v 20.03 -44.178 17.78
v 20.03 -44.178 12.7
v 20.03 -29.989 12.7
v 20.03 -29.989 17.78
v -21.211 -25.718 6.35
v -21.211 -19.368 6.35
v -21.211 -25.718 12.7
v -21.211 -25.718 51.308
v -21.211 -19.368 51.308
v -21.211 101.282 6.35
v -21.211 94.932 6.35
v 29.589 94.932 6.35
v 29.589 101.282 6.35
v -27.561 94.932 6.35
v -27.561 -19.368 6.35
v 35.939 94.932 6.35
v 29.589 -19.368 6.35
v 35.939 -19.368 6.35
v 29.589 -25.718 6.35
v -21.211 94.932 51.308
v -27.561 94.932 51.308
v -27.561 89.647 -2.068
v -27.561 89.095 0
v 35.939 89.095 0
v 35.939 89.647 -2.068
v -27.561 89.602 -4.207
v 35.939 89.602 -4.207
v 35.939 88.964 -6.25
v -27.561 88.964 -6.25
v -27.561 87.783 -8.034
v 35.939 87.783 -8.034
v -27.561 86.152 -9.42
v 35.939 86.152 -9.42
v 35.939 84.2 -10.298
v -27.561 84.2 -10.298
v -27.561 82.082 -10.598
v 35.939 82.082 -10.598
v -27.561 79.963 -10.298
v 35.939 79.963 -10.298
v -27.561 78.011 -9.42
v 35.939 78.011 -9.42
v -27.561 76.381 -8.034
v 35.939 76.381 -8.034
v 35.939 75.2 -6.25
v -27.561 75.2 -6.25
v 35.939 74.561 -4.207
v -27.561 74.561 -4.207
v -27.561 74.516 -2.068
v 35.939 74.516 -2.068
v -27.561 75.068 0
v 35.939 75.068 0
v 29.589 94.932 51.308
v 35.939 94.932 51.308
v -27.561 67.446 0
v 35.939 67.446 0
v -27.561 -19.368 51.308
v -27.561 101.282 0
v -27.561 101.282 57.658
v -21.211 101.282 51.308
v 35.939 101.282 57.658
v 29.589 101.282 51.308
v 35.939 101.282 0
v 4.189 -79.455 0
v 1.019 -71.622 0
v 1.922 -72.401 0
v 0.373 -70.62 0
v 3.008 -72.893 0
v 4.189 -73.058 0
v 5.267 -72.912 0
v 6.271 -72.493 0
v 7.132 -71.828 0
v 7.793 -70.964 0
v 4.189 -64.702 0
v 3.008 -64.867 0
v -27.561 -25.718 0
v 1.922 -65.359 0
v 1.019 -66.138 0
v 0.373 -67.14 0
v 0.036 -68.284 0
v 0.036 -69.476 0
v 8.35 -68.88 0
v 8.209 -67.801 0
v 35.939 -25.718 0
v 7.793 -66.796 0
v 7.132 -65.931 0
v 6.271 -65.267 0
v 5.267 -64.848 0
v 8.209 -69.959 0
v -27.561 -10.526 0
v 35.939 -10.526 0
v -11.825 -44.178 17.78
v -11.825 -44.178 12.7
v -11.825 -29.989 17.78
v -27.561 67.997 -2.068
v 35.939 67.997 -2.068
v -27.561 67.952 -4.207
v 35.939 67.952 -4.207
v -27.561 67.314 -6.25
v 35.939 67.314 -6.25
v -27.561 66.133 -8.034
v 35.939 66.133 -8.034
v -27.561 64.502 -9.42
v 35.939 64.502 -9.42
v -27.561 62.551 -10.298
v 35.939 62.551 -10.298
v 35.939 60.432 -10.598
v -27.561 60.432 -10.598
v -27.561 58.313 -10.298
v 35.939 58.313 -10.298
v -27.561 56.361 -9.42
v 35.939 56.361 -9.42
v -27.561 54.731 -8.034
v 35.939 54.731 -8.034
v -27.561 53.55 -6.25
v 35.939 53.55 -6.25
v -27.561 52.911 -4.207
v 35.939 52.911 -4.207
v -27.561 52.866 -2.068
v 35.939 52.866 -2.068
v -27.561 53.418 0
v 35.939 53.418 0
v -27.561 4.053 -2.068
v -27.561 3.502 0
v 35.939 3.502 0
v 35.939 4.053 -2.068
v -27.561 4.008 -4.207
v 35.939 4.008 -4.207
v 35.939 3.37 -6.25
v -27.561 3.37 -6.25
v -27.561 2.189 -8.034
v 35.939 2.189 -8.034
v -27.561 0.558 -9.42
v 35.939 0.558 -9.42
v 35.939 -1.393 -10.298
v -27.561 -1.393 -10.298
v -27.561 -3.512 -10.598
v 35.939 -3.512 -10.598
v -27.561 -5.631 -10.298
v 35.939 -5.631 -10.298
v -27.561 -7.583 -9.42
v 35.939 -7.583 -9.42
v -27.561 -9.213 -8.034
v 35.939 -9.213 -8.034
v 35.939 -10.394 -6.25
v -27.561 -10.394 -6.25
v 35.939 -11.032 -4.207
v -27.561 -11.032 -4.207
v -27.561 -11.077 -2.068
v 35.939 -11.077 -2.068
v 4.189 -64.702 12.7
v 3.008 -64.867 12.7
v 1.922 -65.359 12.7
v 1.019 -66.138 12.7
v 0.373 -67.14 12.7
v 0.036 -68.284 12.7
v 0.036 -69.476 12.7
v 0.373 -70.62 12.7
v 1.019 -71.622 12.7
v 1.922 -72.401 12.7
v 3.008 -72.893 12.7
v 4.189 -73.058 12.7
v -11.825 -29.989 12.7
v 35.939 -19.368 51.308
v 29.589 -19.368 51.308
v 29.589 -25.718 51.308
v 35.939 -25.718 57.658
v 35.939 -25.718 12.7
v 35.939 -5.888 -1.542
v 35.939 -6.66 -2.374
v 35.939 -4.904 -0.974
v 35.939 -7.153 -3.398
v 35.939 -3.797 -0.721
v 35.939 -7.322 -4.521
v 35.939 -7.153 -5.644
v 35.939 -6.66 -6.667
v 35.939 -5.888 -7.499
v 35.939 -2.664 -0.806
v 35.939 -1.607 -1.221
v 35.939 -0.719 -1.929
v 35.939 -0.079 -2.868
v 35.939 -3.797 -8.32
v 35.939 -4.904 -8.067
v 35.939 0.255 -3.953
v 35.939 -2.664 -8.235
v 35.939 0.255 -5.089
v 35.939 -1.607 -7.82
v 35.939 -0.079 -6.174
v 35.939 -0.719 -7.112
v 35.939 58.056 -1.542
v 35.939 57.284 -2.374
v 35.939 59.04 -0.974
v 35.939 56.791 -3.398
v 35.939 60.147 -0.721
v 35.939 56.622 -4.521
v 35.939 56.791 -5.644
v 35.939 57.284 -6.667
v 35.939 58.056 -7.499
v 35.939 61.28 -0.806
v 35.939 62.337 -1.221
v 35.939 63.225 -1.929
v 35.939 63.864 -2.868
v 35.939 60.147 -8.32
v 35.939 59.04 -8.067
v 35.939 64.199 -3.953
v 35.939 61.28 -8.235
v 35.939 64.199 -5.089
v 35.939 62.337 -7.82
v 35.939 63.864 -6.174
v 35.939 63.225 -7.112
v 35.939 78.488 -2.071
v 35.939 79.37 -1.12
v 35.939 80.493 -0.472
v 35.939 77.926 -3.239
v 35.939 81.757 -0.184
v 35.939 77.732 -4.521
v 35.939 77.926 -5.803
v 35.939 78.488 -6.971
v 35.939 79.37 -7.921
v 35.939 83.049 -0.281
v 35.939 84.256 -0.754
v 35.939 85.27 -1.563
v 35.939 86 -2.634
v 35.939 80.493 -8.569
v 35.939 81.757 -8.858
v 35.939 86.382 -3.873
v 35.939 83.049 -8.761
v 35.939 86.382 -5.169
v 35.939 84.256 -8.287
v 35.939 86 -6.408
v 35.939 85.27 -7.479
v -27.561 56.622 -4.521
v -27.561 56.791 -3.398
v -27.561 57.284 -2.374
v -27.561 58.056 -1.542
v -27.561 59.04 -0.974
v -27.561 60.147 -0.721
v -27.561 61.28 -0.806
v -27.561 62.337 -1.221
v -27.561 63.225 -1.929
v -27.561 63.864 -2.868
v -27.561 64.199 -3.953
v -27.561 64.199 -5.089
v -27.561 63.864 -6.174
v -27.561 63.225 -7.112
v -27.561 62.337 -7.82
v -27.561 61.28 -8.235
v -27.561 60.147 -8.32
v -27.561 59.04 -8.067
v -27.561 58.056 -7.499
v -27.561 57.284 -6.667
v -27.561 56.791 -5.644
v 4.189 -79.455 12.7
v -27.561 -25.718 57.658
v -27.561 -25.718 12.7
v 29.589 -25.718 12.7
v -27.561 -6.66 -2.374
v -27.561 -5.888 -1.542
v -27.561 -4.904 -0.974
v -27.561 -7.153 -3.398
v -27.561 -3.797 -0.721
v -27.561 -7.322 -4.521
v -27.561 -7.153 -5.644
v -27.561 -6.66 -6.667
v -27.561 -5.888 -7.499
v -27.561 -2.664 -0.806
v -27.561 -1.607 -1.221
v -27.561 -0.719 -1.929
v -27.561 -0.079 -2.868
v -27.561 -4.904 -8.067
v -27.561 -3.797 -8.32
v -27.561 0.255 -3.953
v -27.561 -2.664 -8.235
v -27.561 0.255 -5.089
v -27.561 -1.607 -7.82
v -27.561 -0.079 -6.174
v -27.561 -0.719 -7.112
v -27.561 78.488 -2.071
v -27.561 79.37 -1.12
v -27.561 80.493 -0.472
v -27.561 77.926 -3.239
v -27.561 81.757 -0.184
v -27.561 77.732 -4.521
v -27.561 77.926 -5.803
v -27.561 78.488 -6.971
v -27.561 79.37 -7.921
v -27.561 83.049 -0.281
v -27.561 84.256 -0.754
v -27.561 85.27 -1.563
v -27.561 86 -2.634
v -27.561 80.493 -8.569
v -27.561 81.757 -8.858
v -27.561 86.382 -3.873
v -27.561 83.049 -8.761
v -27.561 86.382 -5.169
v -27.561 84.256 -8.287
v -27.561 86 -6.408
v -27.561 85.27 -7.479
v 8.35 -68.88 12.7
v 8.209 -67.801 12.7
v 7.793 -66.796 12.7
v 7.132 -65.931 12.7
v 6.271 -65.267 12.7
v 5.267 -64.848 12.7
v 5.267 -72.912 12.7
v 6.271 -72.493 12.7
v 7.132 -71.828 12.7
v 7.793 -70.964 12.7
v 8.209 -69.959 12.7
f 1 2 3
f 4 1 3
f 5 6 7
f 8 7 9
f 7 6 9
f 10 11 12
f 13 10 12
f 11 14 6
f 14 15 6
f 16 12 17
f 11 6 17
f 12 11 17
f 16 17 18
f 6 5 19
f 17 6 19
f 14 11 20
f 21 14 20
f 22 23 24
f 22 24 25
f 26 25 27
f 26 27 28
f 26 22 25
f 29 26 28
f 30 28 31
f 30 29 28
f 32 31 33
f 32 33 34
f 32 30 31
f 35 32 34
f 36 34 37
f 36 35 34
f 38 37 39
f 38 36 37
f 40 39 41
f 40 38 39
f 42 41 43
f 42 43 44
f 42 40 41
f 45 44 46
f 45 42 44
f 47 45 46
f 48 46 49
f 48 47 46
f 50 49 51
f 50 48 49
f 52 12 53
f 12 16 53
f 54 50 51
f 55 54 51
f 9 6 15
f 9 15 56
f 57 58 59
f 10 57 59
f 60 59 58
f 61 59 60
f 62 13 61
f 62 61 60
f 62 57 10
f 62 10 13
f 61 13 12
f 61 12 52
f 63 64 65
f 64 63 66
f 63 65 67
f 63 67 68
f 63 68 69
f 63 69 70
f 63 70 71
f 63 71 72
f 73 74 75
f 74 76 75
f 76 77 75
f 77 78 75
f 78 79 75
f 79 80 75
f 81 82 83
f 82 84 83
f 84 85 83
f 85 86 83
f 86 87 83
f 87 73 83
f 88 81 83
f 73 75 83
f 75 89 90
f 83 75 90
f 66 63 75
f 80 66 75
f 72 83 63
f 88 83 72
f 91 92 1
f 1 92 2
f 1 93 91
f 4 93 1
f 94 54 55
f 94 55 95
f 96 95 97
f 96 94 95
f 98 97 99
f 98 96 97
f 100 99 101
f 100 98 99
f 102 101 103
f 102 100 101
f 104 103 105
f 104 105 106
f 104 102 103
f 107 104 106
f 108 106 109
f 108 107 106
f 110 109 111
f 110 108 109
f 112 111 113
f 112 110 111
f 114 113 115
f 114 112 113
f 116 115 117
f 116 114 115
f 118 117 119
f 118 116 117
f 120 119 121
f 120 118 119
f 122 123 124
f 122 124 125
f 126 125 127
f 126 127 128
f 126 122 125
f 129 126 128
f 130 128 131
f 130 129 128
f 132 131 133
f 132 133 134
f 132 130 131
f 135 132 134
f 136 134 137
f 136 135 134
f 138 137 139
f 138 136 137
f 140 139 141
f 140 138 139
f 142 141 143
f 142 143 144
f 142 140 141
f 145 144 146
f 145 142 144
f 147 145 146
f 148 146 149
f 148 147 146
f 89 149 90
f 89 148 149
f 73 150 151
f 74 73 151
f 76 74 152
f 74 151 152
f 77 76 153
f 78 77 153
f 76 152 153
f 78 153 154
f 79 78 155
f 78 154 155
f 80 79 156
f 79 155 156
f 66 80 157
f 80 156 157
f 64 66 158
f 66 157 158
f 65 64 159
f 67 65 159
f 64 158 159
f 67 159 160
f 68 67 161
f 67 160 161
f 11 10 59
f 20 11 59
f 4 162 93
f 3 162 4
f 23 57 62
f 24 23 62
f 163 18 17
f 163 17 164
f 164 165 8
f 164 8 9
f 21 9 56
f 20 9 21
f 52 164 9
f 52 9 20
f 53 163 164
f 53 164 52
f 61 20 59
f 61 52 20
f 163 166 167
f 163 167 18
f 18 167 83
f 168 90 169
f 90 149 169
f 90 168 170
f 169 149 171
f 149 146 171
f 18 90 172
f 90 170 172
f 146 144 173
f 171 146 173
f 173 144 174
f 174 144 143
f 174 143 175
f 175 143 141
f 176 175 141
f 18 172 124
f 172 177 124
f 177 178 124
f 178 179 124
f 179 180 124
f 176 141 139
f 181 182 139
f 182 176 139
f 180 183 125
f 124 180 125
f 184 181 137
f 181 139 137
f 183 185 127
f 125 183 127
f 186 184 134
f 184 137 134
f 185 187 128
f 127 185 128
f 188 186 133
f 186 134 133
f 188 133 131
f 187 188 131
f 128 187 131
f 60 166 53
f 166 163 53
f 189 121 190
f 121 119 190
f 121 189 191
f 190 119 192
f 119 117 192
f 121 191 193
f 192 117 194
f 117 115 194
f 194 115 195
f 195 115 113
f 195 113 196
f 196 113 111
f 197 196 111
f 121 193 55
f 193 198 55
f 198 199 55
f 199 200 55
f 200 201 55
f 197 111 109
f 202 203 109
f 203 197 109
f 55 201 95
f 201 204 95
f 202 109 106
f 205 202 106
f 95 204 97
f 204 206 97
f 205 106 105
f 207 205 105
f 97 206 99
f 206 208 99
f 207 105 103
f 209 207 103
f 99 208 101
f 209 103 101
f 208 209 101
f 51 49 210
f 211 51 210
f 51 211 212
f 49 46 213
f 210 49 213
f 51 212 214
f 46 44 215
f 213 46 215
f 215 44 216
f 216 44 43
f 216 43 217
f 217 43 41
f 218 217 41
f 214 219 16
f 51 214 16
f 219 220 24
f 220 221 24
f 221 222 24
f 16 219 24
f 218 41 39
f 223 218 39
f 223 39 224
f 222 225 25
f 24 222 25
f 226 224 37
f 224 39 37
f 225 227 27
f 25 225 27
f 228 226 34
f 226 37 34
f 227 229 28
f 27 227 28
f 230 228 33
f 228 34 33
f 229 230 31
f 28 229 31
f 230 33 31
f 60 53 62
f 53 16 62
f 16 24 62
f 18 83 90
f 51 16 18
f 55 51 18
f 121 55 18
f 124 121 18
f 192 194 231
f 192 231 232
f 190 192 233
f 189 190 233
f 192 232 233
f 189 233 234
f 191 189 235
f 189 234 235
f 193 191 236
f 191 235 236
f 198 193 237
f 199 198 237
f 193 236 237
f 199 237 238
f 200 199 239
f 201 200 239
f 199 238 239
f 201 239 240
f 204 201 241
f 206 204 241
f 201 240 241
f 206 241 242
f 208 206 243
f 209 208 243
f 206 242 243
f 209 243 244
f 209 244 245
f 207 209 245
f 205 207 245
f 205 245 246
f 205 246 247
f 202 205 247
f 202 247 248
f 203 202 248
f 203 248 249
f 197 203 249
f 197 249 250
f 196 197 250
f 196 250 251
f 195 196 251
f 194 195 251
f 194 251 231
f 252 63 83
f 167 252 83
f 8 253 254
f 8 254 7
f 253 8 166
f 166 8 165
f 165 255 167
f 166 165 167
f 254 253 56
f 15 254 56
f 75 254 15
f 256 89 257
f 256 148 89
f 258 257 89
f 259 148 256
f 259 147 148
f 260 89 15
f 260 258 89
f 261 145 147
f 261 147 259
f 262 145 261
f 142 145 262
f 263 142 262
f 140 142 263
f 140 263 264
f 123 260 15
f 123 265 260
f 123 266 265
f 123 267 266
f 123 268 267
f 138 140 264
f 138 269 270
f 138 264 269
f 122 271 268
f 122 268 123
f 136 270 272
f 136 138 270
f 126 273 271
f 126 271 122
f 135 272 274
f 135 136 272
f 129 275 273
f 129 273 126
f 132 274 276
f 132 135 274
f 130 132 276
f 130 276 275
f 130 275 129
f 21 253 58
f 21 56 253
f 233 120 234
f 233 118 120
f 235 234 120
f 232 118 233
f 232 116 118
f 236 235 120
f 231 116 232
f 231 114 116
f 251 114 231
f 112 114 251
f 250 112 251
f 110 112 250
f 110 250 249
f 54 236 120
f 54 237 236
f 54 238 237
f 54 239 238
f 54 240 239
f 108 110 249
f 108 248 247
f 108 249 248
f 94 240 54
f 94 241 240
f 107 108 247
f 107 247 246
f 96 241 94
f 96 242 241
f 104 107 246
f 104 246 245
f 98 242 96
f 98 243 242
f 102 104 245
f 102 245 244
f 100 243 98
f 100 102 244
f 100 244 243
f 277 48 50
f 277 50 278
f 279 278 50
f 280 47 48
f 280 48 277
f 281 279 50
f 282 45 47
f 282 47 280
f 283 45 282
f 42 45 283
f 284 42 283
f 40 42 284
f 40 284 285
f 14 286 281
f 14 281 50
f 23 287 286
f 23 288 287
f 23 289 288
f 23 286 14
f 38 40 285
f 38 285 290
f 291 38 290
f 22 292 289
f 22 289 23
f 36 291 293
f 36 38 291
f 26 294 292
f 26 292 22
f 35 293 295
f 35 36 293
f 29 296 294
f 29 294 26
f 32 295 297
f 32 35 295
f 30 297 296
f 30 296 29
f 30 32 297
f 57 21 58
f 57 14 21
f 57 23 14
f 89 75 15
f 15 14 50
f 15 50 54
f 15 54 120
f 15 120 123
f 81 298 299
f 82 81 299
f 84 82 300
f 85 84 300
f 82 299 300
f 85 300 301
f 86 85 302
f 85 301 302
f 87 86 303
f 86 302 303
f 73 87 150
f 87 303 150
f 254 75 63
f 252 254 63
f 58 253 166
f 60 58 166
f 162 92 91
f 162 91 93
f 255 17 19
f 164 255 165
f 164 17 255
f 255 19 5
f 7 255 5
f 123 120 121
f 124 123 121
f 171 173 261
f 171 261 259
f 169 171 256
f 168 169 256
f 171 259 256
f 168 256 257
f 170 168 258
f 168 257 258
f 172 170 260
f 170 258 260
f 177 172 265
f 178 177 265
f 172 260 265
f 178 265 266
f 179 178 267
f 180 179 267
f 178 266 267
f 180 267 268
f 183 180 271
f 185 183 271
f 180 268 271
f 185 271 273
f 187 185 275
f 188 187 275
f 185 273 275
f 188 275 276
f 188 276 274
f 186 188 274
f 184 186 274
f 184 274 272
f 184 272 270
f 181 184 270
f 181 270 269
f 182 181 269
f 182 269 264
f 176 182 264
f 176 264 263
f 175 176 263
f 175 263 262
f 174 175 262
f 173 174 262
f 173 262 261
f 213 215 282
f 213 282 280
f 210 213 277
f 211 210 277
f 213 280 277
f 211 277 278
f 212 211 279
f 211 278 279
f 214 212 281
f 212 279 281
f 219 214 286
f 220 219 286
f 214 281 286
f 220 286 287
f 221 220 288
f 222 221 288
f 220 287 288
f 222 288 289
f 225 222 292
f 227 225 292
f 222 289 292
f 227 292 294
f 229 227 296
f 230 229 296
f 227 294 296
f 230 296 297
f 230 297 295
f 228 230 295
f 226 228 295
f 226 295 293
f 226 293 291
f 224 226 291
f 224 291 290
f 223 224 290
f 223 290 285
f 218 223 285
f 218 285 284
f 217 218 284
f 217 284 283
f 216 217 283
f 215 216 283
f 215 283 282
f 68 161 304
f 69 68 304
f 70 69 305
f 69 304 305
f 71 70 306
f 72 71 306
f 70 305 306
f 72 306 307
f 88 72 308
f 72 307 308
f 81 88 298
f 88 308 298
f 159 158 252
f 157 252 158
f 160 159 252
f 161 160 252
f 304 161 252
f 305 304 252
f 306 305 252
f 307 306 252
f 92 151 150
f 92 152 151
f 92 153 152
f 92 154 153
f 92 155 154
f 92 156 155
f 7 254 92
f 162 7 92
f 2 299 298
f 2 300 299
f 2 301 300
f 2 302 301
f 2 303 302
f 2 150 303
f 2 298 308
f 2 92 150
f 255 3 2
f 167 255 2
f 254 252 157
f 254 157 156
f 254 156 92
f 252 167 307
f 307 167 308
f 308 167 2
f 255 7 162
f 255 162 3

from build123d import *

# Parameters (mm, degrees)
F0_W      = 63.5
F0_H      = 127
F1_DEPTH  = 57.658
F2_W      = 50.7999993861
F2_H      = 114.3
F3_DEPTH  = 155.702
F4_W      = 114.3000005424
F4_H      = 44.9580000767
F5_DEPTH  = 96.774
F6_W      = 50.8000007063
F6_H      = 44.9580000767
F7_DEPTH  = 127
F8_DEPTH  = 120.142
F9_DEPTH  = 115.824
F11_DEPTH = 12.7
F13_DEPTH = 25.4
F14_W     = 31.8544553593
F14_H     = 14.1892433167
F15_DEPTH = 5.08
F16_R     = 4.3491356376
F16_R_2   = 3.81
F17_DEPTH = 63.5
F18_DEPTH = 94.488


# Not quite as in the source:
# - after a boolean that leaves OpenCascade's solid faulty, fix() repairs it


with BuildPart() as f1:
    # F0 (on Top) → F1 (new body)
    with BuildSketch(Plane.XY):
        with Locations((4.1889519542, 37.7824994028)):
            Rectangle(F0_W, F0_H)
    extrude(amount=F1_DEPTH)

    # F2 (on face) → F3 (cut)
    with BuildSketch(Plane.XY.offset(57.658)):
        with Locations((4.1889529675, 37.7824994028)):
            Rectangle(F2_W, F2_H)
    extrude(amount=-F3_DEPTH, mode=Mode.SUBTRACT)

    # F4 (on face) → F5 (cut)
    with BuildSketch(Plane.YZ.offset(35.9389519542)):
        with Locations((37.7824991316, 28.8289999616)):
            Rectangle(F4_W, F4_H)
    extrude(amount=-F5_DEPTH, mode=Mode.SUBTRACT)

    # F6 (on face) → F7 (cut)
    with BuildSketch(Plane(origin=(0, 101.2824994028, 0), x_dir=(-1, 0, 0), z_dir=(0, 1, 0))):
        with Locations((-4.1889523074, 28.8289999616)):
            Rectangle(F6_W, F6_H)
    extrude(amount=-F7_DEPTH, mode=Mode.SUBTRACT)

    add(f1.part.fix(), mode=Mode.REPLACE)

    # F8 (add): a face of the model
    f8_faces = [f1.faces().sort_by_distance(p)[0] for p in [
        (4.1889529675, -19.3675005972, 3.1749999616),
    ]]
    extrude(f8_faces, amount=F8_DEPTH)

    # F9 (add): a face of the model
    f9_faces = [f1.faces().sort_by_distance(p)[0] for p in [
        (4.1889529675, -19.3675005972, 54.483),
    ]]
    extrude(f9_faces, amount=F9_DEPTH)

    # F10 (on Top) → F11 (join)
    with BuildSketch(Plane.XY):
        Polygon((4.1889519542, -25.7175005972), (-27.5610480458, -25.7175005972), (4.1889519542, -79.4553607702), align=None)
        Polygon((35.9389519542, -25.7175005972), (4.1889519542, -25.7175005972), (4.1889519542, -79.4553607702), align=None)
    extrude(amount=F11_DEPTH)

    # F12 (on face) → F13 (cut)
    with BuildSketch(Plane.XY.offset(12.7)):
        with BuildLine():
            Line((4.1889519963, -73.0581155537), (4.1889520512, -64.701584864))
            ThreePointArc((4.1889520512, -64.701584864), (-0.0063655555, -68.8798501813), (4.1889519963, -73.0581155537))
        make_face()
        with BuildLine():
            ThreePointArc((4.1889519963, -73.0581155537), (7.1324492077, -71.8283317208), (8.3502344445, -68.8798502088))
            ThreePointArc((8.3502344445, -68.8798502088), (7.1324492271, -65.9313687162), (4.1889520512, -64.701584864))
            Line((4.1889520512, -64.701584864), (4.1889519963, -73.0581155537))
        make_face()
    extrude(amount=-F13_DEPTH, mode=Mode.SUBTRACT)

    # F14 (on face) → F15 (join)
    with BuildSketch(Plane.XY.offset(12.7)):
        with Locations((4.1026878171, -37.0831862092)):
            Rectangle(F14_W, F14_H)
    extrude(amount=F15_DEPTH)

    # F16 (on face) → F17 (join)
    with BuildSketch(Plane(origin=(-27.5610480458, 0, 0), x_dir=(0, -1, 0), z_dir=(-1, 0, 0))):
        with BuildLine():
            Line((-75.0678375838, 0), (-89.0953838825, 0))
            ThreePointArc((-89.0953838825, 0), (-82.0816107331, -10.598487235), (-75.0678375838, 0))
        make_face()
        with Locations((-82.0816107331, -4.520711489)):
            Circle(F16_R, mode=Mode.SUBTRACT)
        with BuildLine():
            Line((-53.4179941057, 0), (-67.4455404045, 0))
            ThreePointArc((-67.4455404045, 0), (-60.4317672551, -10.598487235), (-53.4179941057, 0))
        make_face()
        with Locations((-60.4317672551, -4.520711489)):
            Circle(F16_R_2, mode=Mode.SUBTRACT)
        with BuildLine():
            Line((10.5258625229, 0), (-3.5016837758, 0))
            ThreePointArc((-3.5016837758, 0), (3.5120893735, -10.598487235), (10.5258625229, 0))
        make_face()
        with Locations((3.5120893735, -4.520711489)):
            Circle(F16_R_2, mode=Mode.SUBTRACT)
        with Locations((-82.0816107331, -4.520711489)):
            Circle(F16_R)
        with Locations((-60.4317672551, -4.520711489)):
            Circle(F16_R_2)
        with Locations((3.5120893735, -4.520711489)):
            Circle(F16_R_2)
    extrude(amount=-F17_DEPTH)

    # F16 (on face) → F18 (cut)
    with BuildSketch(Plane(origin=(-27.5610480458, 0, 0), x_dir=(0, -1, 0), z_dir=(-1, 0, 0))):
        with Locations((-82.0816107331, -4.520711489)):
            Circle(F16_R)
        with Locations((-60.4317672551, -4.520711489)):
            Circle(F16_R_2)
        with Locations((3.5120893735, -4.520711489)):
            Circle(F16_R_2)
    extrude(amount=-F18_DEPTH, mode=Mode.SUBTRACT)


solid = f1.part
